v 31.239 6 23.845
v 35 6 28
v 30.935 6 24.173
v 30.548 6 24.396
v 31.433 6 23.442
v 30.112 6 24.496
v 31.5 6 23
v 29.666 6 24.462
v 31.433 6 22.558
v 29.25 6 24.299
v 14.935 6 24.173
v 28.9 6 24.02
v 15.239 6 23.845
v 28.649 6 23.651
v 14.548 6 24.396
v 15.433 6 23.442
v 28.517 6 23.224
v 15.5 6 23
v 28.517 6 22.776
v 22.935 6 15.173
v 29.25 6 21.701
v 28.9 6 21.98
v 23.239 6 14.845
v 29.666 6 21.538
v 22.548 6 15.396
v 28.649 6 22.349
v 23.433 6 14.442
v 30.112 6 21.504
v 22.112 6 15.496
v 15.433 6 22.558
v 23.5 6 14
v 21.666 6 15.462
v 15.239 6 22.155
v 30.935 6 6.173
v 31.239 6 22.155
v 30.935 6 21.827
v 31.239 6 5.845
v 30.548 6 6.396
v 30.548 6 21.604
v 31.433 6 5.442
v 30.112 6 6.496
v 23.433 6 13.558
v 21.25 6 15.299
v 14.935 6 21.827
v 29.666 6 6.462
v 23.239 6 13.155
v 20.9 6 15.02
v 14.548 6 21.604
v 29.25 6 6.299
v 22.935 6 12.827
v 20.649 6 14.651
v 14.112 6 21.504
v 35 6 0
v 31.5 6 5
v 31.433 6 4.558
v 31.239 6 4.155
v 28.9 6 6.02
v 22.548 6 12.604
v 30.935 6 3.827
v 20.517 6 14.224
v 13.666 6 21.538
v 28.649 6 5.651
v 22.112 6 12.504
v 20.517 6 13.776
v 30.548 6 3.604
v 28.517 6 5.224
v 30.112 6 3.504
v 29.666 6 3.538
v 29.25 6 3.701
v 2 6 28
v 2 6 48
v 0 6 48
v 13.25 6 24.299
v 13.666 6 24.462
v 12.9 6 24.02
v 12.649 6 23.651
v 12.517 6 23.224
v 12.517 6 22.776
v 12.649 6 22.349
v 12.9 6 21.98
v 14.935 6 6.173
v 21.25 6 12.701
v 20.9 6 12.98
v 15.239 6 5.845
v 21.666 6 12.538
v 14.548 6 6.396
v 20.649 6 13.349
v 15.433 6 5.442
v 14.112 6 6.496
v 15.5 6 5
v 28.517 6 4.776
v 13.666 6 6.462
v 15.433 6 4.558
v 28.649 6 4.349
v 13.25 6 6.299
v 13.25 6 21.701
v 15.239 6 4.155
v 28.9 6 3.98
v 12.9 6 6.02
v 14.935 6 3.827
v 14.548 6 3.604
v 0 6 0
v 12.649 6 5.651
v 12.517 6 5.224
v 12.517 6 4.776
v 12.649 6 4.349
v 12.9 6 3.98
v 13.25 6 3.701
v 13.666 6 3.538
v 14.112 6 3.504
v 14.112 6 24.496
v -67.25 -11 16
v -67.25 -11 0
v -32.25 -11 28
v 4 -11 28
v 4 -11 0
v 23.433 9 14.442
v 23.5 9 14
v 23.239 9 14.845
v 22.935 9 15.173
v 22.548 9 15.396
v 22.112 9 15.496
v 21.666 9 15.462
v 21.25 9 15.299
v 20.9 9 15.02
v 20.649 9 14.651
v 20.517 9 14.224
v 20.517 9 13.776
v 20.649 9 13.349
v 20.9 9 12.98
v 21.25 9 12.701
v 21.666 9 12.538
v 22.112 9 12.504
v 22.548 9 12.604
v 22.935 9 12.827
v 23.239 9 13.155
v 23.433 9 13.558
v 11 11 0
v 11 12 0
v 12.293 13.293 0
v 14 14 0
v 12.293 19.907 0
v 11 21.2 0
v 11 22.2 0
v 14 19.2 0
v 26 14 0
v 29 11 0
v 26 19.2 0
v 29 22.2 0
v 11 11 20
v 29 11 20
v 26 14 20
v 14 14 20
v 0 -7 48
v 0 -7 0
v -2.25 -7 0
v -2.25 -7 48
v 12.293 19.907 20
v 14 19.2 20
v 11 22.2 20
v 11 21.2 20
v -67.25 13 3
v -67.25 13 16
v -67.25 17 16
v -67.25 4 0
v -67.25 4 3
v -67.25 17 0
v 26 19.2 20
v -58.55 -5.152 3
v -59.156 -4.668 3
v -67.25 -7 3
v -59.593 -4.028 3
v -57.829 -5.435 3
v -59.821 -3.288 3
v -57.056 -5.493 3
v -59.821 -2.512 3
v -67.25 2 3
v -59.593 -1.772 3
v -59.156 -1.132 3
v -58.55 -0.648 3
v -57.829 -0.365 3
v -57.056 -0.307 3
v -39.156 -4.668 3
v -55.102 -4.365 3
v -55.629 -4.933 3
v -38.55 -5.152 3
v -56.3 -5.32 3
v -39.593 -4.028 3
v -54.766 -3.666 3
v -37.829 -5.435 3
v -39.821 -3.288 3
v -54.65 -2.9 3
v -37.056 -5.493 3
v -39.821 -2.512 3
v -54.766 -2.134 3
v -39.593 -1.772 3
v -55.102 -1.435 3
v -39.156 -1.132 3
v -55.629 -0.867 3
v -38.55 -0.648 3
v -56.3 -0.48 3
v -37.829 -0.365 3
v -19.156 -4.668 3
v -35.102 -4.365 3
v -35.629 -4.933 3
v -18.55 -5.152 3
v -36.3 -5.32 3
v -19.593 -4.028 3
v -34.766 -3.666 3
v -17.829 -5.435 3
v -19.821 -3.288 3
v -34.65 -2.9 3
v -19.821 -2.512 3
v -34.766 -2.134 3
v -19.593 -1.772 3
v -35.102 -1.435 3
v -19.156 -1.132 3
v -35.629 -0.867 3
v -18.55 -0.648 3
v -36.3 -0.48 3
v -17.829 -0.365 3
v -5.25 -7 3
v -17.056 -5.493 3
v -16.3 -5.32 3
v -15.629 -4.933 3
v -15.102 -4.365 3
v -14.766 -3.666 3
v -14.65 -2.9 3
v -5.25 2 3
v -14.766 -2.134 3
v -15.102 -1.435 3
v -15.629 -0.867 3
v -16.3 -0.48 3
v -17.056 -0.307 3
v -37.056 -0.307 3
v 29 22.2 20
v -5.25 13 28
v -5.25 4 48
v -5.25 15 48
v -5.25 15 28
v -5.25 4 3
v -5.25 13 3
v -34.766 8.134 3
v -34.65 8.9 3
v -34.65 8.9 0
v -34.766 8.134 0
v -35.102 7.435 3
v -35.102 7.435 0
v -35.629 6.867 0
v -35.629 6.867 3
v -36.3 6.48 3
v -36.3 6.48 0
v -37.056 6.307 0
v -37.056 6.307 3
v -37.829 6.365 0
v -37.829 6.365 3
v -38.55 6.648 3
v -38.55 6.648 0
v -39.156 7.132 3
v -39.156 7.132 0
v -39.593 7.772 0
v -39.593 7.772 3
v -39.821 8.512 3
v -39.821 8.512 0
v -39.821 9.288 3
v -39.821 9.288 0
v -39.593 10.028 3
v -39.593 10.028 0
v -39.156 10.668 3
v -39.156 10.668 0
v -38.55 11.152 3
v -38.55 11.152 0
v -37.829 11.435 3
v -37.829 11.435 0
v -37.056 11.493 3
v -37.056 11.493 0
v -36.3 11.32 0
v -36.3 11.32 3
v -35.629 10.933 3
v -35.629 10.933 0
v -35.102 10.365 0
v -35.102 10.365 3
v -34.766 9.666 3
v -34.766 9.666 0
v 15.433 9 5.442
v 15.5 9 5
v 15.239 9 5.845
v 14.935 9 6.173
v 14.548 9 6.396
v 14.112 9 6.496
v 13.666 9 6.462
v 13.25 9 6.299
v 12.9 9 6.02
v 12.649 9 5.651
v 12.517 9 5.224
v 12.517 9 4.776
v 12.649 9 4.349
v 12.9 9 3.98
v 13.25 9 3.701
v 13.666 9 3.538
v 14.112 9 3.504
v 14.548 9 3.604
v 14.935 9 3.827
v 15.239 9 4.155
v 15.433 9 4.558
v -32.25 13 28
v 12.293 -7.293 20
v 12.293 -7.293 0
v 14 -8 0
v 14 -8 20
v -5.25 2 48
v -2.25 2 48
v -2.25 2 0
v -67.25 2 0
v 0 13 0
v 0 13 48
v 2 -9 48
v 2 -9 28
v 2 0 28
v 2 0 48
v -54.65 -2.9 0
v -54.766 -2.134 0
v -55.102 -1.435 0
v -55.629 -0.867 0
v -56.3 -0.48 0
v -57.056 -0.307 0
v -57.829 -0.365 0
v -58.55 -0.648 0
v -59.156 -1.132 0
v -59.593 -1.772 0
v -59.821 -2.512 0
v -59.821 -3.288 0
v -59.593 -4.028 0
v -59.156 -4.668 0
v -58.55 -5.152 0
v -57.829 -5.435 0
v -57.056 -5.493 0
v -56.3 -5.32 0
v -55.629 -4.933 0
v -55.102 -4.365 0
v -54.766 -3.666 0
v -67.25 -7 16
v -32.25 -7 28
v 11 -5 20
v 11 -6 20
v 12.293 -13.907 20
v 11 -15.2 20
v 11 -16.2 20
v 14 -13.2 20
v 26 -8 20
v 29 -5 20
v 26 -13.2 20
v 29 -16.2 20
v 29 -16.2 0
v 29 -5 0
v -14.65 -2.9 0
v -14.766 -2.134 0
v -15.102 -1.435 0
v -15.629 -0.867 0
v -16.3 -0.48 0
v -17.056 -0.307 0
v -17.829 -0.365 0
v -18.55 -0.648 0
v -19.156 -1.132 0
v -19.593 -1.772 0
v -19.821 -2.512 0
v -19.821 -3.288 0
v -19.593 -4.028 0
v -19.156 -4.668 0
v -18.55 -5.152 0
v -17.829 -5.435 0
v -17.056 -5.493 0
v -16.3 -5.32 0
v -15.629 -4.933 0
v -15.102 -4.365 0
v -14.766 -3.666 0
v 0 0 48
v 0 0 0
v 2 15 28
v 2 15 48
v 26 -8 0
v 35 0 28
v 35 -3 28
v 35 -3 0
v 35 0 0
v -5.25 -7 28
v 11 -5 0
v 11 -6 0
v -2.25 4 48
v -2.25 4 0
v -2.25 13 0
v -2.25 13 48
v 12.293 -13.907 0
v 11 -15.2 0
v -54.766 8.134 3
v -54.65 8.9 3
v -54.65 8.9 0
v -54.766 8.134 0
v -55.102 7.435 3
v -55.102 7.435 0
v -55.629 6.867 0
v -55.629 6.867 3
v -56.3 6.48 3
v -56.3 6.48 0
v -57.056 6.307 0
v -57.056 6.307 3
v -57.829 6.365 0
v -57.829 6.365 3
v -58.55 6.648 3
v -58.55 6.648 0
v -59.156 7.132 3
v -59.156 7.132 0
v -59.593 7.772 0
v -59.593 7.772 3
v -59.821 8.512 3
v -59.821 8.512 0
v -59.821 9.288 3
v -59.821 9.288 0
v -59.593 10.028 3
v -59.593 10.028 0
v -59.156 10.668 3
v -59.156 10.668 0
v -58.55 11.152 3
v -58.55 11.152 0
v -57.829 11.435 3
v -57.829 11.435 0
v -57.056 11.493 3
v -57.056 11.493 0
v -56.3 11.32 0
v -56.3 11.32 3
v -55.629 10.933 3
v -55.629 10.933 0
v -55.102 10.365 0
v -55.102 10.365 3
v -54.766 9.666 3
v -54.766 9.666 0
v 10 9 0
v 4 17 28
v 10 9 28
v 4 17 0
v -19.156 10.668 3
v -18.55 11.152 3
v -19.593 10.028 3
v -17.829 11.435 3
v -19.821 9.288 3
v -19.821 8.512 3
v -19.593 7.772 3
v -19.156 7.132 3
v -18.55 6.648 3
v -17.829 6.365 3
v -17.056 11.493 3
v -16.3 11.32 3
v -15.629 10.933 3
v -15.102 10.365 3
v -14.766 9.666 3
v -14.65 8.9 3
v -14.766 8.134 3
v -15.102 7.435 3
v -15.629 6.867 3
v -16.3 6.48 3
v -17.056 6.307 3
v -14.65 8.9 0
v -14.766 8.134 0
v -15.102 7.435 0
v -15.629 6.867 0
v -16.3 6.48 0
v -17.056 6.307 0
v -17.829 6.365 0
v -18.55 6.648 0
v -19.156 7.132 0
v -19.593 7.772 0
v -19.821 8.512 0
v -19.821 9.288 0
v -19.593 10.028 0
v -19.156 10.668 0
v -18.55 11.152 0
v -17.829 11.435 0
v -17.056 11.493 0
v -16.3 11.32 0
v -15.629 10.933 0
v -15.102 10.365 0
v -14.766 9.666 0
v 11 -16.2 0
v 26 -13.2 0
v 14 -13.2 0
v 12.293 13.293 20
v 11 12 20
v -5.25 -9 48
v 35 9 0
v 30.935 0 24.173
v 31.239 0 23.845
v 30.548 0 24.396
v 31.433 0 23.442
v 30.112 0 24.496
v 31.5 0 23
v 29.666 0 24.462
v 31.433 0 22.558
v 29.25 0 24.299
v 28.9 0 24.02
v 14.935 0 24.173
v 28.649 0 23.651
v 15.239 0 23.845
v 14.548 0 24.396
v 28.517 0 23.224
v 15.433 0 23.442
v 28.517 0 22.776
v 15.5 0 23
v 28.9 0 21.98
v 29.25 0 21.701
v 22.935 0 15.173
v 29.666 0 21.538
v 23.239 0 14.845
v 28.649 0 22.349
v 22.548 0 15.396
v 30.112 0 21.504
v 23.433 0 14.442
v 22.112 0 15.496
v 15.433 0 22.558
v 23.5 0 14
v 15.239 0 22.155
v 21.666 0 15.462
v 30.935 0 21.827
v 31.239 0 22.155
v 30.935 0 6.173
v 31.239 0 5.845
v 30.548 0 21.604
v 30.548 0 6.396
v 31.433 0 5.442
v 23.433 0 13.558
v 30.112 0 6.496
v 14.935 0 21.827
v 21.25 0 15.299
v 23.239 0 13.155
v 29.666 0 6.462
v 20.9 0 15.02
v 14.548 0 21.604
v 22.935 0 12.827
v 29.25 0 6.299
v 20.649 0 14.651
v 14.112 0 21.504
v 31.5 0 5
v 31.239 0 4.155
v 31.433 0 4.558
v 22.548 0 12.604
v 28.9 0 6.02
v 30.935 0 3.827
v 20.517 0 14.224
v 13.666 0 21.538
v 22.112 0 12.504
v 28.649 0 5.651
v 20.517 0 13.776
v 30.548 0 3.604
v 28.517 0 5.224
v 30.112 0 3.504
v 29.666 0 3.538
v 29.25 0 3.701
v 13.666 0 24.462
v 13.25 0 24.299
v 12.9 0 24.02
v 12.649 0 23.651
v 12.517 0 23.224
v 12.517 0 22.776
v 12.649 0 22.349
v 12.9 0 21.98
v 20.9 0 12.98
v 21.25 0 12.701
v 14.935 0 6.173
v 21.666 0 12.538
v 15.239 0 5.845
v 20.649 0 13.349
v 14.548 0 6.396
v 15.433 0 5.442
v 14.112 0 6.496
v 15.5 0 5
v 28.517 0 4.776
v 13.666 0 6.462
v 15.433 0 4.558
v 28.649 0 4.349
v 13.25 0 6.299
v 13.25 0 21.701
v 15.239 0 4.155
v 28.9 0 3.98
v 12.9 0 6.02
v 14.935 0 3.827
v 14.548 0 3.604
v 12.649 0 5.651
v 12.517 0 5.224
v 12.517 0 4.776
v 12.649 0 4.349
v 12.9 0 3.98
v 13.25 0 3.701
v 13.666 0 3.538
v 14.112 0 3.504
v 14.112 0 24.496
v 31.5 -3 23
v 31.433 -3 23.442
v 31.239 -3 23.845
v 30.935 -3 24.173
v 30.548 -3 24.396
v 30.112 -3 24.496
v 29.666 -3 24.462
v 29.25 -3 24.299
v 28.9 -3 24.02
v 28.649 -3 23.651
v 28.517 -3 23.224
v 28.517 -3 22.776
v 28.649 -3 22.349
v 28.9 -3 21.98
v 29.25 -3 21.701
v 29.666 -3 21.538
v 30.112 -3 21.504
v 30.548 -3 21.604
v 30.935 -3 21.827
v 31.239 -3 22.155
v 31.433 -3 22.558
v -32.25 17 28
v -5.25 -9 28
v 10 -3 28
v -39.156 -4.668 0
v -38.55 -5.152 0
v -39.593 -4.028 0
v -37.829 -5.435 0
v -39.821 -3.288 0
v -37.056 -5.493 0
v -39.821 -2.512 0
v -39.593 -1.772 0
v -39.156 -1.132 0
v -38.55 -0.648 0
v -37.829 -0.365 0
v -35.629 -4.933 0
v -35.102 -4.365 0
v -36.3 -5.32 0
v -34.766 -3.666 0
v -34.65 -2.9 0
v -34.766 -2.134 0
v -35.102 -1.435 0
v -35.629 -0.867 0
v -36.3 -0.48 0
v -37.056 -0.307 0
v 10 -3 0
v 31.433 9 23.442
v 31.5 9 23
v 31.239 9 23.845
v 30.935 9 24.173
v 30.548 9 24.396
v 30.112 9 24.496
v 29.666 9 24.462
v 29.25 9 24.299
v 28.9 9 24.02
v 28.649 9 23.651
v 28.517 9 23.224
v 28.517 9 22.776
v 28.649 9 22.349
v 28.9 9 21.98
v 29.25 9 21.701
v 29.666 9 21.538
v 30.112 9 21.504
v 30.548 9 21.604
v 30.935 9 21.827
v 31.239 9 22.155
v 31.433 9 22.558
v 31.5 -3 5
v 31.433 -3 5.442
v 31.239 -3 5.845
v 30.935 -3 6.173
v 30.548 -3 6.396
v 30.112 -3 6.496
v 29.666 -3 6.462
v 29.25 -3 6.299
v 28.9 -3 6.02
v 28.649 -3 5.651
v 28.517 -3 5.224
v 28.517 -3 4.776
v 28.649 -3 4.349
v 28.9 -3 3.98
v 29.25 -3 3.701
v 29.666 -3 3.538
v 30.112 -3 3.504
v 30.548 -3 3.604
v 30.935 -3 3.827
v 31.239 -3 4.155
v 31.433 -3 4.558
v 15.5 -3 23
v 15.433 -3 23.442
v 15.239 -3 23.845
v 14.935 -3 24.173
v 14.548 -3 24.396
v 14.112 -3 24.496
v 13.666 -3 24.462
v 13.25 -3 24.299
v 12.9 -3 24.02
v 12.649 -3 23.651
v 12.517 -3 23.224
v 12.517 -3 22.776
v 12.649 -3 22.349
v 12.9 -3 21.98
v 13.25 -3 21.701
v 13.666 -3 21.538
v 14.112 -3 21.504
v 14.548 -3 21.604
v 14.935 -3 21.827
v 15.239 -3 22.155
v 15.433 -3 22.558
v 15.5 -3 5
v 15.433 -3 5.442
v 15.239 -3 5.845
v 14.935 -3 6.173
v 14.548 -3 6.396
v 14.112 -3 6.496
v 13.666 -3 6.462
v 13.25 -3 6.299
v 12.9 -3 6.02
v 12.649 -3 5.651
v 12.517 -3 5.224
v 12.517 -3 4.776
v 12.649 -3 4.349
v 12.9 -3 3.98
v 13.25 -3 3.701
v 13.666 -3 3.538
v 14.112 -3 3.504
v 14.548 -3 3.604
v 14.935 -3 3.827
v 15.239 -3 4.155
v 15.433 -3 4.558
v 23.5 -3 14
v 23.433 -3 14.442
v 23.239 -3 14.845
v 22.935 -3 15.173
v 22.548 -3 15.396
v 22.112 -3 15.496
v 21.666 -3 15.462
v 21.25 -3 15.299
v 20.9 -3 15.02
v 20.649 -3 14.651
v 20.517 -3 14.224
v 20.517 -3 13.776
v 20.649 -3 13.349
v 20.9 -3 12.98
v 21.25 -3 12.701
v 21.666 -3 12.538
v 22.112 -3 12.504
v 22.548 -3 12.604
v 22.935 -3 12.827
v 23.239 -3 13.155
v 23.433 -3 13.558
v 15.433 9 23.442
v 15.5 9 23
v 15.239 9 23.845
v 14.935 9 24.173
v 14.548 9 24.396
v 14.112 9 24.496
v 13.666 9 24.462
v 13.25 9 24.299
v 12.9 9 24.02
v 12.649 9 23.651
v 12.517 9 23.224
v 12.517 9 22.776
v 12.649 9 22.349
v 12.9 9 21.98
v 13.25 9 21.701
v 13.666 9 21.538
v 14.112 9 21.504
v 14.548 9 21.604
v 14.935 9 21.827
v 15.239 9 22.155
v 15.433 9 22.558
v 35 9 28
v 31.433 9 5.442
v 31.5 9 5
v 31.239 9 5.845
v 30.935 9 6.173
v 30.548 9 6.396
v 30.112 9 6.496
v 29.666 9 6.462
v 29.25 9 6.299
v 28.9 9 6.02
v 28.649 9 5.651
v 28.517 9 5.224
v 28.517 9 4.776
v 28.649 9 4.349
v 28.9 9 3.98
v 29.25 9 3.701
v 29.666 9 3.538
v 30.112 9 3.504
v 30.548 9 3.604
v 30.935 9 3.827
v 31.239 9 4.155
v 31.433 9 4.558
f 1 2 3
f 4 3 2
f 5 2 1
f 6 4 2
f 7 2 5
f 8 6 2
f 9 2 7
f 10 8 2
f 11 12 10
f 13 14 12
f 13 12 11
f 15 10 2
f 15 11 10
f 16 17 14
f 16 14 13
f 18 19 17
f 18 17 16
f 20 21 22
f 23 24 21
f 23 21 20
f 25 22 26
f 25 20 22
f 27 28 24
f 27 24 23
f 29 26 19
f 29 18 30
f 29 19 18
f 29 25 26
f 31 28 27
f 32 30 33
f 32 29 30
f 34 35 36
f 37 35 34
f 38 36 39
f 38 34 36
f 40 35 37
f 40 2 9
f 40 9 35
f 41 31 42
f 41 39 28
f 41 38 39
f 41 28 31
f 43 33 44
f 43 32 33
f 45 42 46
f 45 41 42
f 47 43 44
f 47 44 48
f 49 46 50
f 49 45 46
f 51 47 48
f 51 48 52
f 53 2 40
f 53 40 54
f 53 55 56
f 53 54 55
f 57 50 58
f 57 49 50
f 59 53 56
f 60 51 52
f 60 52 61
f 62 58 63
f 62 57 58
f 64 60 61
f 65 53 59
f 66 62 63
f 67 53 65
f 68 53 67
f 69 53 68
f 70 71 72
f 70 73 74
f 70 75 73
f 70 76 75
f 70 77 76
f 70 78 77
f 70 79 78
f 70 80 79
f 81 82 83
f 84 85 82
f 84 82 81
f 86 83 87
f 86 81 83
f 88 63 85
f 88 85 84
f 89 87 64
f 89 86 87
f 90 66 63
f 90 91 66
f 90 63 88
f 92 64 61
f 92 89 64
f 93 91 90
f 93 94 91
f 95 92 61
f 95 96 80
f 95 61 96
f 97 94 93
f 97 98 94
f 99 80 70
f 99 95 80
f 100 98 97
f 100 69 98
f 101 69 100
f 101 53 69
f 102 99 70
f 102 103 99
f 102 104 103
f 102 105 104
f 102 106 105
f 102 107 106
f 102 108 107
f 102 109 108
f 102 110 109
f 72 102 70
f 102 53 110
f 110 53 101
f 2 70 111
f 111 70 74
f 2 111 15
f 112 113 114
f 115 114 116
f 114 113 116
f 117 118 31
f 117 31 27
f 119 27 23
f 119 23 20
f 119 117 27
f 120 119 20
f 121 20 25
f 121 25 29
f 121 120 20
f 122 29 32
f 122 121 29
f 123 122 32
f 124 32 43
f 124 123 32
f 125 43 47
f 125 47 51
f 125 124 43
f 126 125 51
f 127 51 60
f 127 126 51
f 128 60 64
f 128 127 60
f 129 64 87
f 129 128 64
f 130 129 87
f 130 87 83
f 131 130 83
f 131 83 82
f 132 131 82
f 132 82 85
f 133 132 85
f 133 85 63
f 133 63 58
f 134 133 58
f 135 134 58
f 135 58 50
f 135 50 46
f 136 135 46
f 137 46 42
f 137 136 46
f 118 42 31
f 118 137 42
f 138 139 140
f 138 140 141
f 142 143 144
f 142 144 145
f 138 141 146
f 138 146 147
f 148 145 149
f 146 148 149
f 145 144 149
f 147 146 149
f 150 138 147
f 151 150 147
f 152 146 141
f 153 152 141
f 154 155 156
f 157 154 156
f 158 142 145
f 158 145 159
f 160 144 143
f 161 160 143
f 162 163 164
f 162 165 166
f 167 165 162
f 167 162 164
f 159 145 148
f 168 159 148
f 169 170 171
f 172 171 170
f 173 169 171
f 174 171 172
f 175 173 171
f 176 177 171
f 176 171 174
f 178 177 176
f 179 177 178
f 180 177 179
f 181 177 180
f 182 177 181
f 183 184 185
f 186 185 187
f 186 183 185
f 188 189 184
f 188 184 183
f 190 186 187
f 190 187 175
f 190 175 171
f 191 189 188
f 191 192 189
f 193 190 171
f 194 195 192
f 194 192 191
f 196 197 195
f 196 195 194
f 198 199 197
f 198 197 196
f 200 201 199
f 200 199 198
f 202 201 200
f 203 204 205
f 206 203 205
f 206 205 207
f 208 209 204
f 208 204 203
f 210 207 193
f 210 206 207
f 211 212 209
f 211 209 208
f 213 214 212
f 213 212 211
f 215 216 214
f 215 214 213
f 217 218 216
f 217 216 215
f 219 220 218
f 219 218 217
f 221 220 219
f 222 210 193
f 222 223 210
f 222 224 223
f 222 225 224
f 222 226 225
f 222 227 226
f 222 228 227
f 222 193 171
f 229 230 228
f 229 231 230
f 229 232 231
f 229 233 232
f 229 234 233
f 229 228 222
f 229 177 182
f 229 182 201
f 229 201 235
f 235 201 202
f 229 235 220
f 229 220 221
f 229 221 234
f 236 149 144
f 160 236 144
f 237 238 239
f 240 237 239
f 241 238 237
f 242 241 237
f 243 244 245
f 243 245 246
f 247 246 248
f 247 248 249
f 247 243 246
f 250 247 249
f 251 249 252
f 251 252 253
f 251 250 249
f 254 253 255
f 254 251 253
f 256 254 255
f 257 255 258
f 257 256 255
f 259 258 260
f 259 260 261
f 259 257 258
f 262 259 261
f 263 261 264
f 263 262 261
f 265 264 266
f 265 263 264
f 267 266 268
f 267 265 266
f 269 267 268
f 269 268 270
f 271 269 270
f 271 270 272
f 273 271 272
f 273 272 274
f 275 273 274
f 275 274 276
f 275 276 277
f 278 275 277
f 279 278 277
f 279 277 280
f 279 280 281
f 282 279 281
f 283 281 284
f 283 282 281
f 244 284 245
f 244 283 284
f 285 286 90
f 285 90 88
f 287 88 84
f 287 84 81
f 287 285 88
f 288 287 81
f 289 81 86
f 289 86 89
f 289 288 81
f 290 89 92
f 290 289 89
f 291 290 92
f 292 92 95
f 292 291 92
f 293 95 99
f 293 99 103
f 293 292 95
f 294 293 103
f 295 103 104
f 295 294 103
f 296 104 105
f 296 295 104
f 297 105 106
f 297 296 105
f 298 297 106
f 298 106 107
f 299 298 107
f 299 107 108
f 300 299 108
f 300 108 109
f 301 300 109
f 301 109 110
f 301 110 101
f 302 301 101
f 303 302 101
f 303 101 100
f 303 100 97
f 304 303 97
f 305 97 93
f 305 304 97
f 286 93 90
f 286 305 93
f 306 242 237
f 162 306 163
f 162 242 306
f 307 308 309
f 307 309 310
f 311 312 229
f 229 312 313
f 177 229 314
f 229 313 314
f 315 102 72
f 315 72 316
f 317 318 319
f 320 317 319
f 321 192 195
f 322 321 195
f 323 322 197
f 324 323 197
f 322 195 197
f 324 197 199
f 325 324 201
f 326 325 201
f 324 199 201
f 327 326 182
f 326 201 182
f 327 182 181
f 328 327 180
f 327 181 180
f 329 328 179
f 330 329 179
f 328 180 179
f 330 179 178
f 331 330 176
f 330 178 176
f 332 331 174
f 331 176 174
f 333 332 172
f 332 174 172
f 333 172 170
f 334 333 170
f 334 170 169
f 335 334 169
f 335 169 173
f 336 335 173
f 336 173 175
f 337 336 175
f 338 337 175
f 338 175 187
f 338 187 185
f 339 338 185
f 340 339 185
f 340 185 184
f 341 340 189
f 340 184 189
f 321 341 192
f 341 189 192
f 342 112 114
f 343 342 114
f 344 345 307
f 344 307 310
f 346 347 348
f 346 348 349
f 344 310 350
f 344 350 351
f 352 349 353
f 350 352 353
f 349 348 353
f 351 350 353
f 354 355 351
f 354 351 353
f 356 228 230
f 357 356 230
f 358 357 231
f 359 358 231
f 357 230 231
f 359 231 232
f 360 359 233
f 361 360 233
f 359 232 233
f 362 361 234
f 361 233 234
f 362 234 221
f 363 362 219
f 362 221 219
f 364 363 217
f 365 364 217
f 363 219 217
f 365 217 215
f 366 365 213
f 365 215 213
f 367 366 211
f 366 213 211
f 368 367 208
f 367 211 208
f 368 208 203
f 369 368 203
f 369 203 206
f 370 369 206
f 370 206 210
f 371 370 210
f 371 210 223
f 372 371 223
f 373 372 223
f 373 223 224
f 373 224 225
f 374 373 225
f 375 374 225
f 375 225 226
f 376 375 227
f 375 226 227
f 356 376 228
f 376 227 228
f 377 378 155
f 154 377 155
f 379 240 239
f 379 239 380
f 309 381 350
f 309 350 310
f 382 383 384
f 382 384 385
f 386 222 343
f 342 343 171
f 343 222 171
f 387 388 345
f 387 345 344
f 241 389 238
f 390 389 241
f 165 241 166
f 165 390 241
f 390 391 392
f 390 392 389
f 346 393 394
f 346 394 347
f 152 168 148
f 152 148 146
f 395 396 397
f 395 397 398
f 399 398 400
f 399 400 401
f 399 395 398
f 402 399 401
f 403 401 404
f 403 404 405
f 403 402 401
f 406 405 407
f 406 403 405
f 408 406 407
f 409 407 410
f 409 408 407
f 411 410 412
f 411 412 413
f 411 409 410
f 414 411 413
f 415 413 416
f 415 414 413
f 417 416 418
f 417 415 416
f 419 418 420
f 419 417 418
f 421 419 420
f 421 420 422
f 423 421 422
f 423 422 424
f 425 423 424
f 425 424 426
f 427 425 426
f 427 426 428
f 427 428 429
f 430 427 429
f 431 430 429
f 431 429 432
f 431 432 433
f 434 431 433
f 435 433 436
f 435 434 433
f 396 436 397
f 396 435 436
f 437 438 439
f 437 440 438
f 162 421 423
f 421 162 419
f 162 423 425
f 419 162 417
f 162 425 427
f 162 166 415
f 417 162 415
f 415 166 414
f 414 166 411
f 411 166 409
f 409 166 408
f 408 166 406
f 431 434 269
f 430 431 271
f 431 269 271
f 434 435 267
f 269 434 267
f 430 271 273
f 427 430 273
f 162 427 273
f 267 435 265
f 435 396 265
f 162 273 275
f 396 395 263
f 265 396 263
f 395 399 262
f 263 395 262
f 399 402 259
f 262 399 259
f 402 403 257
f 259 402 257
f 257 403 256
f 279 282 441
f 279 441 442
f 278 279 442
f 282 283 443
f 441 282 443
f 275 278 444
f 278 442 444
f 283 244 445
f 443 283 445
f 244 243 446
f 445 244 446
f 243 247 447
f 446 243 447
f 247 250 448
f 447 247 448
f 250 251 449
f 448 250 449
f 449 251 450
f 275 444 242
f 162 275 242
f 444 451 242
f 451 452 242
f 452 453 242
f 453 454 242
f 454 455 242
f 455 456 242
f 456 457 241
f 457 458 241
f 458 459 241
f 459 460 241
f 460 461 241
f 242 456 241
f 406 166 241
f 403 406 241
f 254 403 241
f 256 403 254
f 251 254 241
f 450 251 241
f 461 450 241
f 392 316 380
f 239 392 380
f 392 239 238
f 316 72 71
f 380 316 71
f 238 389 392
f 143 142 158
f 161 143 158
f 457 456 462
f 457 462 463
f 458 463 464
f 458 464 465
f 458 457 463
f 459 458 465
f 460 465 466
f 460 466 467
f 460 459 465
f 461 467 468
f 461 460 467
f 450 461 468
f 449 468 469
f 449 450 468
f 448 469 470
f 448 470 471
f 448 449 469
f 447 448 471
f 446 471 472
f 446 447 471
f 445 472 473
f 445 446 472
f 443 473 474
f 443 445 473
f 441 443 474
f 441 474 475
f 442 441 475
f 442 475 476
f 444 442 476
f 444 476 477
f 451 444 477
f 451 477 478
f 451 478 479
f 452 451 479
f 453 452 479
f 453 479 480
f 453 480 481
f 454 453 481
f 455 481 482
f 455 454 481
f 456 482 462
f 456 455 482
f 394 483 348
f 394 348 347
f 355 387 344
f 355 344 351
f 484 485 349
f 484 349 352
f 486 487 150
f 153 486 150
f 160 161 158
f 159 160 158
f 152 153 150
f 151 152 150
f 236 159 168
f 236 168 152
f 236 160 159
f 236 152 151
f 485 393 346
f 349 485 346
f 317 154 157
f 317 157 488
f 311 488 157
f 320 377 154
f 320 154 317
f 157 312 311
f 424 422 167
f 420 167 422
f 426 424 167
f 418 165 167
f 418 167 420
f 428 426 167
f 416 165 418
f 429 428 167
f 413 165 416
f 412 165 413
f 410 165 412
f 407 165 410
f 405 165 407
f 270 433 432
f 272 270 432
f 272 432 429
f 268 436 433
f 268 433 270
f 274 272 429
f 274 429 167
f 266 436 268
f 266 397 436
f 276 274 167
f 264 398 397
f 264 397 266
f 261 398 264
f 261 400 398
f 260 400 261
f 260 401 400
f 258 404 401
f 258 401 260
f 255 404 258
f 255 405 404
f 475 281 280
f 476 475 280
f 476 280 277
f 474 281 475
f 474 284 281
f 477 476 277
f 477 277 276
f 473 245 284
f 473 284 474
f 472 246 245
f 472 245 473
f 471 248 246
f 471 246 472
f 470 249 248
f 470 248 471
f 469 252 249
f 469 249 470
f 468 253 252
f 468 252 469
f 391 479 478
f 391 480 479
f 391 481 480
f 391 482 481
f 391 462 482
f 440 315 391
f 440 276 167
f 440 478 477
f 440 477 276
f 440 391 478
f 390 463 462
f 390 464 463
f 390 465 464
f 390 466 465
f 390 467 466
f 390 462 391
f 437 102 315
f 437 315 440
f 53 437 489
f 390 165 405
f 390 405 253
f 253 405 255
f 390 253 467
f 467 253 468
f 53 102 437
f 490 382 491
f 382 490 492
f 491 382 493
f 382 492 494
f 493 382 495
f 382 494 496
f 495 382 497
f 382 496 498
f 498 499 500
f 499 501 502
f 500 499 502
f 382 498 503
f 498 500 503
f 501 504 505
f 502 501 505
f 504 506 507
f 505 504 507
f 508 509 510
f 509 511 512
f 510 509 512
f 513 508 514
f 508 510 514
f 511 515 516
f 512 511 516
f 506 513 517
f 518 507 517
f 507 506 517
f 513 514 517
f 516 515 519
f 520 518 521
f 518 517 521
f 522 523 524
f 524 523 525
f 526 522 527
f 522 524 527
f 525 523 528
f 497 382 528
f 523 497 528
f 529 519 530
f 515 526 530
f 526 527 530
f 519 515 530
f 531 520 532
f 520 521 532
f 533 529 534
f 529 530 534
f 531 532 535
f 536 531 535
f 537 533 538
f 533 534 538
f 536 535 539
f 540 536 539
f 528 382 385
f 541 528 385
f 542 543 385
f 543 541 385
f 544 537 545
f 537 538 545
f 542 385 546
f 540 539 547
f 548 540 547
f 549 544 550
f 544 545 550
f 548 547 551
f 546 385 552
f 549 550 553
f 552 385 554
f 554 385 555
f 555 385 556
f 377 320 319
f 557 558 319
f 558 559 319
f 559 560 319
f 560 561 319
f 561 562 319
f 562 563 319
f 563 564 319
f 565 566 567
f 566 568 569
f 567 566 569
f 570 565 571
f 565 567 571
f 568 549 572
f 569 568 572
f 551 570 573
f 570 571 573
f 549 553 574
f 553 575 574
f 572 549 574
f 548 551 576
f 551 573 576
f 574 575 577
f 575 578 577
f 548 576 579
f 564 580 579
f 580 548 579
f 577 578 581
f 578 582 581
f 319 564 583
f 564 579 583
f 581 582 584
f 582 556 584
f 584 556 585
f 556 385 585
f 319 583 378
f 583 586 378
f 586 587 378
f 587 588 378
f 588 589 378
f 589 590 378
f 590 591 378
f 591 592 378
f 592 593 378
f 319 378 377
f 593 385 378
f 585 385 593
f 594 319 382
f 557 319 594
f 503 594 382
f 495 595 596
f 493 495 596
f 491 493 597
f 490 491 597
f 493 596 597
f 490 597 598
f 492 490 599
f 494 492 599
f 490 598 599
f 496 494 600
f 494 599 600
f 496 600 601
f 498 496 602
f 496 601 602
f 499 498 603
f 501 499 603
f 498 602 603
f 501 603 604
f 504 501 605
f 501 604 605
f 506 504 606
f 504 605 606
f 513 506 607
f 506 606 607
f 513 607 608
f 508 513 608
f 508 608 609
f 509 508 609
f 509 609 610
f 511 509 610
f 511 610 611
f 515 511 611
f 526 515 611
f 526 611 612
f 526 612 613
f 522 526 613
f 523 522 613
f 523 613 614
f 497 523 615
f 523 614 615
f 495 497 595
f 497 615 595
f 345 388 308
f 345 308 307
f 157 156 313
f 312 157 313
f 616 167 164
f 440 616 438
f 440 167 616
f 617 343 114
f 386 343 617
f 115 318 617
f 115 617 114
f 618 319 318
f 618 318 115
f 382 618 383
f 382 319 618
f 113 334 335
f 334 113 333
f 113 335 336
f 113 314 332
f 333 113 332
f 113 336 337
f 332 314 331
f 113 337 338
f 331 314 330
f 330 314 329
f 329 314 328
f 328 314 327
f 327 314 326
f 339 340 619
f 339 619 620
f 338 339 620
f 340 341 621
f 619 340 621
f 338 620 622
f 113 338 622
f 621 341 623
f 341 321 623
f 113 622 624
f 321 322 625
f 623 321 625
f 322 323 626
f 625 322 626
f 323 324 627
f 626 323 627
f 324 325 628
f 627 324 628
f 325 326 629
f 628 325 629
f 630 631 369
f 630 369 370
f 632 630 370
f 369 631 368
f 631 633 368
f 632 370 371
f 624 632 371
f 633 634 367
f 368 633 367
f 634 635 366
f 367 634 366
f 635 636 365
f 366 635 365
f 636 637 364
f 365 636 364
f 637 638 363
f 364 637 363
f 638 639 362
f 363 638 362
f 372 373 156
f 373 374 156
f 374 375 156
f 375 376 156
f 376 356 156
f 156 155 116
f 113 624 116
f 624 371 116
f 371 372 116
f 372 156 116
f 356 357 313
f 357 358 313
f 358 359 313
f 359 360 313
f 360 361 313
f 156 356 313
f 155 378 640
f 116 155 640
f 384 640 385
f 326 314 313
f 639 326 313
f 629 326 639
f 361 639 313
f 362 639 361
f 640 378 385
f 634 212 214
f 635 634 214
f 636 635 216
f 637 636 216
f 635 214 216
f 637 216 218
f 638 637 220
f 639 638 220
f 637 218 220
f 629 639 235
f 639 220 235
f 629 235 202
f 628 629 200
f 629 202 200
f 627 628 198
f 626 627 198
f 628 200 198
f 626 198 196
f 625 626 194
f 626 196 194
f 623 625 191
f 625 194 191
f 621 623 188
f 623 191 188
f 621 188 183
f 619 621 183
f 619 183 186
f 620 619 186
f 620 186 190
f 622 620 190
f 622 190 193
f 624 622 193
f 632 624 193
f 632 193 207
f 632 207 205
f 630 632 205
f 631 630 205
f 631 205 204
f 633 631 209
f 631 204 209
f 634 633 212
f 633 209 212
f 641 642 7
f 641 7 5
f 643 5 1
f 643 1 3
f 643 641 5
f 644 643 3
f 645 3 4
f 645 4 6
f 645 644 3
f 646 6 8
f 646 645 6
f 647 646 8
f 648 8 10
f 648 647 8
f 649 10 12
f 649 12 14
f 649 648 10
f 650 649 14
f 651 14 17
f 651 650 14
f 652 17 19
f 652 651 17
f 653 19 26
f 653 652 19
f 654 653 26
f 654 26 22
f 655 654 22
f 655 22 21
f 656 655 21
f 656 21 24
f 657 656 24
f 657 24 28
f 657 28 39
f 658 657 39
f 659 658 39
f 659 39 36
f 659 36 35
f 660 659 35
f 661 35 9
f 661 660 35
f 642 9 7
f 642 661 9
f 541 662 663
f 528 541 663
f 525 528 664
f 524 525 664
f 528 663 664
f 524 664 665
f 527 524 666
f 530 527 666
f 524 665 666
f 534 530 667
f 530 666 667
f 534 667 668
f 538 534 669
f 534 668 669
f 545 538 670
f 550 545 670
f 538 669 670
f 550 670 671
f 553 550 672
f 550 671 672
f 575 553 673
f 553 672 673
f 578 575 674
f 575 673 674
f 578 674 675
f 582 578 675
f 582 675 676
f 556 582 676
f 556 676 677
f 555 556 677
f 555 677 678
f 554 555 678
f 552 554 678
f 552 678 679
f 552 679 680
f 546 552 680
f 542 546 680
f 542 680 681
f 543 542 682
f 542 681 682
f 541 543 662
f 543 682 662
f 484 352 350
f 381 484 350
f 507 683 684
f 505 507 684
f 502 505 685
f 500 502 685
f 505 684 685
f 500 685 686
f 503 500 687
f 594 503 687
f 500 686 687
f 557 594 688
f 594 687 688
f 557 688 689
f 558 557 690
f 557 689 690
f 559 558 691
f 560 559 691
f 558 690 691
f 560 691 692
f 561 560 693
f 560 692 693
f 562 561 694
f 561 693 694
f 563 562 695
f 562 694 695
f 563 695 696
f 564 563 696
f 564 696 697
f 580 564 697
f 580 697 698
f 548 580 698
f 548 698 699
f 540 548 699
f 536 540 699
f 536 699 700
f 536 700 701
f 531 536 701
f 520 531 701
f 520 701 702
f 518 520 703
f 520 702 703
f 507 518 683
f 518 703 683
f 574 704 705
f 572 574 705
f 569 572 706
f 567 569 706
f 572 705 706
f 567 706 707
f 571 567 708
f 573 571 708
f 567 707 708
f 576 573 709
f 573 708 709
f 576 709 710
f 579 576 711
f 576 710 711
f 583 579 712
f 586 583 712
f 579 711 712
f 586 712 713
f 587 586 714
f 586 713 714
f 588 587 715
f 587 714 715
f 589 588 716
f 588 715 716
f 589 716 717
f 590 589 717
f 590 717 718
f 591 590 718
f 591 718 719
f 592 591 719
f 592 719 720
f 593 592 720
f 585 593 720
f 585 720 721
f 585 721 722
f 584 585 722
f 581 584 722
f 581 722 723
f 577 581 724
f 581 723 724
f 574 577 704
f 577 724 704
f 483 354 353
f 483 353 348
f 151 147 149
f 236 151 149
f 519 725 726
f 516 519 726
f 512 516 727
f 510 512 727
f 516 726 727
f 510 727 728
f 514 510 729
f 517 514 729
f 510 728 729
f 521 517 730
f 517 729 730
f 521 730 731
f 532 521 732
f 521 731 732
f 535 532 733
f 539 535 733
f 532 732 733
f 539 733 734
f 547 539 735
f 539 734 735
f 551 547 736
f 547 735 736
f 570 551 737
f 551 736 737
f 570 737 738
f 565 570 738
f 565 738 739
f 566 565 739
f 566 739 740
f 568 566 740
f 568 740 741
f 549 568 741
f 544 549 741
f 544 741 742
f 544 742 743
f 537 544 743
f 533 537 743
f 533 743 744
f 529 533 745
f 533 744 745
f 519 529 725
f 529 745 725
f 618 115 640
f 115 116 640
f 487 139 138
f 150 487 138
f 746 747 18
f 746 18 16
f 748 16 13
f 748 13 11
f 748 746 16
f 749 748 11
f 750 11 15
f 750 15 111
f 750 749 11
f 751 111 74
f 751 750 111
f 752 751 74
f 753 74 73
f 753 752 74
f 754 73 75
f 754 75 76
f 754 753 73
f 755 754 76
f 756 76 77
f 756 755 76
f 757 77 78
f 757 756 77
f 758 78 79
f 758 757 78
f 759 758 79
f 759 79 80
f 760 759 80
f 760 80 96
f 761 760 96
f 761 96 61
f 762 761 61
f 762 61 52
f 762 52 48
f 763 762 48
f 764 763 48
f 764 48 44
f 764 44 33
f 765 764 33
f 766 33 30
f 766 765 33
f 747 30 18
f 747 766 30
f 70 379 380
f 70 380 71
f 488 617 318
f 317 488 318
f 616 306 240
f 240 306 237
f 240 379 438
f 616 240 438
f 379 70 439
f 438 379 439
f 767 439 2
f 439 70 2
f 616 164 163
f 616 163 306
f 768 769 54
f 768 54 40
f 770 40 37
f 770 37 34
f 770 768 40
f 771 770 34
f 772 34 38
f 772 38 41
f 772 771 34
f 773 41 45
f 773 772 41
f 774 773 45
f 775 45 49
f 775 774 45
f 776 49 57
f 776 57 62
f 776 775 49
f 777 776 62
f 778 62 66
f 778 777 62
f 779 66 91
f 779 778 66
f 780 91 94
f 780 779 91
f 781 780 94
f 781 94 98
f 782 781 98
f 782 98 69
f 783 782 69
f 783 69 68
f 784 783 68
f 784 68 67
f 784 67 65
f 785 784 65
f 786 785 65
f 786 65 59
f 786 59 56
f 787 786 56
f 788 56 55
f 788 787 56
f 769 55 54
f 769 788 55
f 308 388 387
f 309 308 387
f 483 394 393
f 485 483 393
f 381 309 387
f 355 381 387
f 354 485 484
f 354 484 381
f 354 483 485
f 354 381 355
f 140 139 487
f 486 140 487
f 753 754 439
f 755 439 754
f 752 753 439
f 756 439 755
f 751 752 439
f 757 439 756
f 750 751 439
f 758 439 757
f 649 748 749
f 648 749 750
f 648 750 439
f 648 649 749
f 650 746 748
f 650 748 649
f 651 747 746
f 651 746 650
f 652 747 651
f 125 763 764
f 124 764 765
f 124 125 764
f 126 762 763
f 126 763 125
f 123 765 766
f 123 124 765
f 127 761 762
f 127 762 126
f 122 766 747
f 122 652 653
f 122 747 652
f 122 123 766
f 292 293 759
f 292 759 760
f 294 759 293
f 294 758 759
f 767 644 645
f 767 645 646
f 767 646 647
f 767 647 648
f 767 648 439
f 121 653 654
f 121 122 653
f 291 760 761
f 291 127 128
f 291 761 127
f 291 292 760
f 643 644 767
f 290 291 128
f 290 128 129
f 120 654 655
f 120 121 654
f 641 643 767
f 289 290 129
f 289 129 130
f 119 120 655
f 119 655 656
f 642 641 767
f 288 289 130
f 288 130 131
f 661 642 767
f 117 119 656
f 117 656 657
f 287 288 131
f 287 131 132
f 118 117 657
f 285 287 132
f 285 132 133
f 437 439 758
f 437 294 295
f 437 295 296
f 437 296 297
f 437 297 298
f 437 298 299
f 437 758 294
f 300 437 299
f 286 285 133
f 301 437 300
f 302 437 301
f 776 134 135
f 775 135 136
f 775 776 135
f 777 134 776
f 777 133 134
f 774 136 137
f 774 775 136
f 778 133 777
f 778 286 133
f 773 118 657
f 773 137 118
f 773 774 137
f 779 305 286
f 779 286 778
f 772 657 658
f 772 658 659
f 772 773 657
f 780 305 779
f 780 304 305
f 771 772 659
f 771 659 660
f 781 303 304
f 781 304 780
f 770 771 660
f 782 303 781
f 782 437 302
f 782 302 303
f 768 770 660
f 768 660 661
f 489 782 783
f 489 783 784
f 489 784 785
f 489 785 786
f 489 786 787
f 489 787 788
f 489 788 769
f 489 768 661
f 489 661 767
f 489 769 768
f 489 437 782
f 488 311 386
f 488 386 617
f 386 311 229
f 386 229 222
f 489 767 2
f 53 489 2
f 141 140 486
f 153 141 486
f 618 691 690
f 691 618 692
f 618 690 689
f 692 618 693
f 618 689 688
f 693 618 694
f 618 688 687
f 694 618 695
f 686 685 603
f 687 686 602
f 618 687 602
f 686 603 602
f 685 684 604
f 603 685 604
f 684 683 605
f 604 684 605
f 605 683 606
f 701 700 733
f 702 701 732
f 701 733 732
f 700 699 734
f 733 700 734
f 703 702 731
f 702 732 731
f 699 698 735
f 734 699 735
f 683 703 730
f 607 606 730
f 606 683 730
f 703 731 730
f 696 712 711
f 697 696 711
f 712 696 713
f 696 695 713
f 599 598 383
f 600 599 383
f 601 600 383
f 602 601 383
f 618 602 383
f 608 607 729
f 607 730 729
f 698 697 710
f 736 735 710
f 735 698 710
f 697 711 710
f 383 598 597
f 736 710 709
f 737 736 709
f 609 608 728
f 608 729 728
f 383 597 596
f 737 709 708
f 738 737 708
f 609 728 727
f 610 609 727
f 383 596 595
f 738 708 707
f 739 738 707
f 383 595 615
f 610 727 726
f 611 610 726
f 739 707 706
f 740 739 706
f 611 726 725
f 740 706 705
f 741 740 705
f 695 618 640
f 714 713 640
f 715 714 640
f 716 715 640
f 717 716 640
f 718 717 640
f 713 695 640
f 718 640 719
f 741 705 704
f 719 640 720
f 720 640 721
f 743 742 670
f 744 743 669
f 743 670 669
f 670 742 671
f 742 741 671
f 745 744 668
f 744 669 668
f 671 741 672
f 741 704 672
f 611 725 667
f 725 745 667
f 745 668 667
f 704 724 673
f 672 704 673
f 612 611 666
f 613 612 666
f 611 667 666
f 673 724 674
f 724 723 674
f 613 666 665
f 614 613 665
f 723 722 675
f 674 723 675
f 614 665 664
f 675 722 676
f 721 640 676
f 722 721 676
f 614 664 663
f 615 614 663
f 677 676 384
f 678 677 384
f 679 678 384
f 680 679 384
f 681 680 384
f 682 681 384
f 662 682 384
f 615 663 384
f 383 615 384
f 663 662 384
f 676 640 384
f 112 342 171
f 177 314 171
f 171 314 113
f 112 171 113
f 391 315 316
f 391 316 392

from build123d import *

# Parameters (mm, degrees)
F1_DEPTH  = 3
F3_DEPTH  = 25
F5_R      = 2.6
F6_DEPTH  = 3
F7_R      = 1.5
F8_DEPTH  = 3
F10_DEPTH = 4
F12_DEPTH = 20
F15_DEPTH = 20
F16_SIZE  = 2
F17_SIZE  = 1


with BuildPart() as f1:
    # F0 (on Top) → F1 (new body)
    with BuildSketch(Plane.XY):
        Polygon((0, 0), (0, -7), (-2.25, -7), (-2.25, 2), (-67.25, 2), (-67.25, -11), (-2.25, -11), (4, -11), (10, -3), (35, -3), (35, 0), align=None)
    extrude(amount=F1_DEPTH)

    # F2 (on face) → F3 (join)
    with BuildSketch(Plane.XY.offset(3)):
        Polygon((35, 0), (0, 0), (0, -7), (-2.25, -7), (-2.25, 2), (-5.25, 2), (-5.25, -7), (-67.25, -7), (-67.25, -11), (4, -11), (10, -3), (35, -3), align=None)
    extrude(amount=F3_DEPTH)

    # F5 (on face) → F6 (cut, through all)
    with BuildSketch(Plane.XY.offset(3)):
        with Locations((-17.25, -2.9)):
            Circle(F5_R)
        with Locations((-37.25, -2.9)):
            Circle(F5_R)
        with Locations((-57.25, -2.9)):
            Circle(F5_R)
    extrude(amount=-F6_DEPTH, mode=Mode.SUBTRACT)

    # F7 (on face) → F8 (cut, through all)
    with BuildSketch(Plane.XZ.offset(3)):
        with Locations((30, 5)):
            Circle(F7_R)
        with Locations((14, 5)):
            Circle(F7_R)
        with Locations((14, 23)):
            Circle(F7_R)
        with Locations((30, 23)):
            Circle(F7_R)
        with Locations((22, 14)):
            Circle(F7_R)
    extrude(amount=-F8_DEPTH, mode=Mode.SUBTRACT)

    # F9 (on face) → F10 (cut, through all)
    with BuildSketch(Plane.XZ.offset(11)):
        Polygon((-67.25, 28), (-67.25, 16), (-32.25, 28), align=None)
    extrude(amount=-F10_DEPTH, mode=Mode.SUBTRACT)

    # F11 (on face) → F12 (join)
    with BuildSketch(Plane.XY.offset(28)):
        Polygon((-2.25, -7), (-2.25, 2), (-5.25, 2), (-5.25, -9), (2, -9), (2, 0), (0, 0), (0, -7), align=None)
    extrude(amount=F12_DEPTH)


with BuildPart() as f13_1:
    # F13: instance of F1
    add(f1.part.mirror(Plane.XZ.offset(-3)))


with BuildPart() as f15:
    # F14 (on Top) → F15 (new body)
    with BuildSketch(Plane.XY):
        Polygon((26, 14), (11, 14), (11, 11), (29, 11), (29, 22.2), (11, 22.2), (11, 19.2), (26, 19.2), align=None)
    extrude(amount=F15_DEPTH)

    # F16
    f16_edges = [f15.edges().sort_by_distance(p)[0] for p in [
        (11, 19.2, 10),
        (11, 14, 10),
    ]]
    chamfer(f16_edges, length=F16_SIZE)

    # F17
    f17_edges = [f15.edges().sort_by_distance(p)[0] for p in [
        (13, 14, 10),
        (13, 19.2, 10),
    ]]
    chamfer(f17_edges, length=F17_SIZE)


with BuildPart() as f18_1:
    # F18: instance of F15
    add(f15.part.mirror(Plane.XZ.offset(-3)))


solid = Compound([f1.part, f13_1.part, f15.part, f18_1.part])
